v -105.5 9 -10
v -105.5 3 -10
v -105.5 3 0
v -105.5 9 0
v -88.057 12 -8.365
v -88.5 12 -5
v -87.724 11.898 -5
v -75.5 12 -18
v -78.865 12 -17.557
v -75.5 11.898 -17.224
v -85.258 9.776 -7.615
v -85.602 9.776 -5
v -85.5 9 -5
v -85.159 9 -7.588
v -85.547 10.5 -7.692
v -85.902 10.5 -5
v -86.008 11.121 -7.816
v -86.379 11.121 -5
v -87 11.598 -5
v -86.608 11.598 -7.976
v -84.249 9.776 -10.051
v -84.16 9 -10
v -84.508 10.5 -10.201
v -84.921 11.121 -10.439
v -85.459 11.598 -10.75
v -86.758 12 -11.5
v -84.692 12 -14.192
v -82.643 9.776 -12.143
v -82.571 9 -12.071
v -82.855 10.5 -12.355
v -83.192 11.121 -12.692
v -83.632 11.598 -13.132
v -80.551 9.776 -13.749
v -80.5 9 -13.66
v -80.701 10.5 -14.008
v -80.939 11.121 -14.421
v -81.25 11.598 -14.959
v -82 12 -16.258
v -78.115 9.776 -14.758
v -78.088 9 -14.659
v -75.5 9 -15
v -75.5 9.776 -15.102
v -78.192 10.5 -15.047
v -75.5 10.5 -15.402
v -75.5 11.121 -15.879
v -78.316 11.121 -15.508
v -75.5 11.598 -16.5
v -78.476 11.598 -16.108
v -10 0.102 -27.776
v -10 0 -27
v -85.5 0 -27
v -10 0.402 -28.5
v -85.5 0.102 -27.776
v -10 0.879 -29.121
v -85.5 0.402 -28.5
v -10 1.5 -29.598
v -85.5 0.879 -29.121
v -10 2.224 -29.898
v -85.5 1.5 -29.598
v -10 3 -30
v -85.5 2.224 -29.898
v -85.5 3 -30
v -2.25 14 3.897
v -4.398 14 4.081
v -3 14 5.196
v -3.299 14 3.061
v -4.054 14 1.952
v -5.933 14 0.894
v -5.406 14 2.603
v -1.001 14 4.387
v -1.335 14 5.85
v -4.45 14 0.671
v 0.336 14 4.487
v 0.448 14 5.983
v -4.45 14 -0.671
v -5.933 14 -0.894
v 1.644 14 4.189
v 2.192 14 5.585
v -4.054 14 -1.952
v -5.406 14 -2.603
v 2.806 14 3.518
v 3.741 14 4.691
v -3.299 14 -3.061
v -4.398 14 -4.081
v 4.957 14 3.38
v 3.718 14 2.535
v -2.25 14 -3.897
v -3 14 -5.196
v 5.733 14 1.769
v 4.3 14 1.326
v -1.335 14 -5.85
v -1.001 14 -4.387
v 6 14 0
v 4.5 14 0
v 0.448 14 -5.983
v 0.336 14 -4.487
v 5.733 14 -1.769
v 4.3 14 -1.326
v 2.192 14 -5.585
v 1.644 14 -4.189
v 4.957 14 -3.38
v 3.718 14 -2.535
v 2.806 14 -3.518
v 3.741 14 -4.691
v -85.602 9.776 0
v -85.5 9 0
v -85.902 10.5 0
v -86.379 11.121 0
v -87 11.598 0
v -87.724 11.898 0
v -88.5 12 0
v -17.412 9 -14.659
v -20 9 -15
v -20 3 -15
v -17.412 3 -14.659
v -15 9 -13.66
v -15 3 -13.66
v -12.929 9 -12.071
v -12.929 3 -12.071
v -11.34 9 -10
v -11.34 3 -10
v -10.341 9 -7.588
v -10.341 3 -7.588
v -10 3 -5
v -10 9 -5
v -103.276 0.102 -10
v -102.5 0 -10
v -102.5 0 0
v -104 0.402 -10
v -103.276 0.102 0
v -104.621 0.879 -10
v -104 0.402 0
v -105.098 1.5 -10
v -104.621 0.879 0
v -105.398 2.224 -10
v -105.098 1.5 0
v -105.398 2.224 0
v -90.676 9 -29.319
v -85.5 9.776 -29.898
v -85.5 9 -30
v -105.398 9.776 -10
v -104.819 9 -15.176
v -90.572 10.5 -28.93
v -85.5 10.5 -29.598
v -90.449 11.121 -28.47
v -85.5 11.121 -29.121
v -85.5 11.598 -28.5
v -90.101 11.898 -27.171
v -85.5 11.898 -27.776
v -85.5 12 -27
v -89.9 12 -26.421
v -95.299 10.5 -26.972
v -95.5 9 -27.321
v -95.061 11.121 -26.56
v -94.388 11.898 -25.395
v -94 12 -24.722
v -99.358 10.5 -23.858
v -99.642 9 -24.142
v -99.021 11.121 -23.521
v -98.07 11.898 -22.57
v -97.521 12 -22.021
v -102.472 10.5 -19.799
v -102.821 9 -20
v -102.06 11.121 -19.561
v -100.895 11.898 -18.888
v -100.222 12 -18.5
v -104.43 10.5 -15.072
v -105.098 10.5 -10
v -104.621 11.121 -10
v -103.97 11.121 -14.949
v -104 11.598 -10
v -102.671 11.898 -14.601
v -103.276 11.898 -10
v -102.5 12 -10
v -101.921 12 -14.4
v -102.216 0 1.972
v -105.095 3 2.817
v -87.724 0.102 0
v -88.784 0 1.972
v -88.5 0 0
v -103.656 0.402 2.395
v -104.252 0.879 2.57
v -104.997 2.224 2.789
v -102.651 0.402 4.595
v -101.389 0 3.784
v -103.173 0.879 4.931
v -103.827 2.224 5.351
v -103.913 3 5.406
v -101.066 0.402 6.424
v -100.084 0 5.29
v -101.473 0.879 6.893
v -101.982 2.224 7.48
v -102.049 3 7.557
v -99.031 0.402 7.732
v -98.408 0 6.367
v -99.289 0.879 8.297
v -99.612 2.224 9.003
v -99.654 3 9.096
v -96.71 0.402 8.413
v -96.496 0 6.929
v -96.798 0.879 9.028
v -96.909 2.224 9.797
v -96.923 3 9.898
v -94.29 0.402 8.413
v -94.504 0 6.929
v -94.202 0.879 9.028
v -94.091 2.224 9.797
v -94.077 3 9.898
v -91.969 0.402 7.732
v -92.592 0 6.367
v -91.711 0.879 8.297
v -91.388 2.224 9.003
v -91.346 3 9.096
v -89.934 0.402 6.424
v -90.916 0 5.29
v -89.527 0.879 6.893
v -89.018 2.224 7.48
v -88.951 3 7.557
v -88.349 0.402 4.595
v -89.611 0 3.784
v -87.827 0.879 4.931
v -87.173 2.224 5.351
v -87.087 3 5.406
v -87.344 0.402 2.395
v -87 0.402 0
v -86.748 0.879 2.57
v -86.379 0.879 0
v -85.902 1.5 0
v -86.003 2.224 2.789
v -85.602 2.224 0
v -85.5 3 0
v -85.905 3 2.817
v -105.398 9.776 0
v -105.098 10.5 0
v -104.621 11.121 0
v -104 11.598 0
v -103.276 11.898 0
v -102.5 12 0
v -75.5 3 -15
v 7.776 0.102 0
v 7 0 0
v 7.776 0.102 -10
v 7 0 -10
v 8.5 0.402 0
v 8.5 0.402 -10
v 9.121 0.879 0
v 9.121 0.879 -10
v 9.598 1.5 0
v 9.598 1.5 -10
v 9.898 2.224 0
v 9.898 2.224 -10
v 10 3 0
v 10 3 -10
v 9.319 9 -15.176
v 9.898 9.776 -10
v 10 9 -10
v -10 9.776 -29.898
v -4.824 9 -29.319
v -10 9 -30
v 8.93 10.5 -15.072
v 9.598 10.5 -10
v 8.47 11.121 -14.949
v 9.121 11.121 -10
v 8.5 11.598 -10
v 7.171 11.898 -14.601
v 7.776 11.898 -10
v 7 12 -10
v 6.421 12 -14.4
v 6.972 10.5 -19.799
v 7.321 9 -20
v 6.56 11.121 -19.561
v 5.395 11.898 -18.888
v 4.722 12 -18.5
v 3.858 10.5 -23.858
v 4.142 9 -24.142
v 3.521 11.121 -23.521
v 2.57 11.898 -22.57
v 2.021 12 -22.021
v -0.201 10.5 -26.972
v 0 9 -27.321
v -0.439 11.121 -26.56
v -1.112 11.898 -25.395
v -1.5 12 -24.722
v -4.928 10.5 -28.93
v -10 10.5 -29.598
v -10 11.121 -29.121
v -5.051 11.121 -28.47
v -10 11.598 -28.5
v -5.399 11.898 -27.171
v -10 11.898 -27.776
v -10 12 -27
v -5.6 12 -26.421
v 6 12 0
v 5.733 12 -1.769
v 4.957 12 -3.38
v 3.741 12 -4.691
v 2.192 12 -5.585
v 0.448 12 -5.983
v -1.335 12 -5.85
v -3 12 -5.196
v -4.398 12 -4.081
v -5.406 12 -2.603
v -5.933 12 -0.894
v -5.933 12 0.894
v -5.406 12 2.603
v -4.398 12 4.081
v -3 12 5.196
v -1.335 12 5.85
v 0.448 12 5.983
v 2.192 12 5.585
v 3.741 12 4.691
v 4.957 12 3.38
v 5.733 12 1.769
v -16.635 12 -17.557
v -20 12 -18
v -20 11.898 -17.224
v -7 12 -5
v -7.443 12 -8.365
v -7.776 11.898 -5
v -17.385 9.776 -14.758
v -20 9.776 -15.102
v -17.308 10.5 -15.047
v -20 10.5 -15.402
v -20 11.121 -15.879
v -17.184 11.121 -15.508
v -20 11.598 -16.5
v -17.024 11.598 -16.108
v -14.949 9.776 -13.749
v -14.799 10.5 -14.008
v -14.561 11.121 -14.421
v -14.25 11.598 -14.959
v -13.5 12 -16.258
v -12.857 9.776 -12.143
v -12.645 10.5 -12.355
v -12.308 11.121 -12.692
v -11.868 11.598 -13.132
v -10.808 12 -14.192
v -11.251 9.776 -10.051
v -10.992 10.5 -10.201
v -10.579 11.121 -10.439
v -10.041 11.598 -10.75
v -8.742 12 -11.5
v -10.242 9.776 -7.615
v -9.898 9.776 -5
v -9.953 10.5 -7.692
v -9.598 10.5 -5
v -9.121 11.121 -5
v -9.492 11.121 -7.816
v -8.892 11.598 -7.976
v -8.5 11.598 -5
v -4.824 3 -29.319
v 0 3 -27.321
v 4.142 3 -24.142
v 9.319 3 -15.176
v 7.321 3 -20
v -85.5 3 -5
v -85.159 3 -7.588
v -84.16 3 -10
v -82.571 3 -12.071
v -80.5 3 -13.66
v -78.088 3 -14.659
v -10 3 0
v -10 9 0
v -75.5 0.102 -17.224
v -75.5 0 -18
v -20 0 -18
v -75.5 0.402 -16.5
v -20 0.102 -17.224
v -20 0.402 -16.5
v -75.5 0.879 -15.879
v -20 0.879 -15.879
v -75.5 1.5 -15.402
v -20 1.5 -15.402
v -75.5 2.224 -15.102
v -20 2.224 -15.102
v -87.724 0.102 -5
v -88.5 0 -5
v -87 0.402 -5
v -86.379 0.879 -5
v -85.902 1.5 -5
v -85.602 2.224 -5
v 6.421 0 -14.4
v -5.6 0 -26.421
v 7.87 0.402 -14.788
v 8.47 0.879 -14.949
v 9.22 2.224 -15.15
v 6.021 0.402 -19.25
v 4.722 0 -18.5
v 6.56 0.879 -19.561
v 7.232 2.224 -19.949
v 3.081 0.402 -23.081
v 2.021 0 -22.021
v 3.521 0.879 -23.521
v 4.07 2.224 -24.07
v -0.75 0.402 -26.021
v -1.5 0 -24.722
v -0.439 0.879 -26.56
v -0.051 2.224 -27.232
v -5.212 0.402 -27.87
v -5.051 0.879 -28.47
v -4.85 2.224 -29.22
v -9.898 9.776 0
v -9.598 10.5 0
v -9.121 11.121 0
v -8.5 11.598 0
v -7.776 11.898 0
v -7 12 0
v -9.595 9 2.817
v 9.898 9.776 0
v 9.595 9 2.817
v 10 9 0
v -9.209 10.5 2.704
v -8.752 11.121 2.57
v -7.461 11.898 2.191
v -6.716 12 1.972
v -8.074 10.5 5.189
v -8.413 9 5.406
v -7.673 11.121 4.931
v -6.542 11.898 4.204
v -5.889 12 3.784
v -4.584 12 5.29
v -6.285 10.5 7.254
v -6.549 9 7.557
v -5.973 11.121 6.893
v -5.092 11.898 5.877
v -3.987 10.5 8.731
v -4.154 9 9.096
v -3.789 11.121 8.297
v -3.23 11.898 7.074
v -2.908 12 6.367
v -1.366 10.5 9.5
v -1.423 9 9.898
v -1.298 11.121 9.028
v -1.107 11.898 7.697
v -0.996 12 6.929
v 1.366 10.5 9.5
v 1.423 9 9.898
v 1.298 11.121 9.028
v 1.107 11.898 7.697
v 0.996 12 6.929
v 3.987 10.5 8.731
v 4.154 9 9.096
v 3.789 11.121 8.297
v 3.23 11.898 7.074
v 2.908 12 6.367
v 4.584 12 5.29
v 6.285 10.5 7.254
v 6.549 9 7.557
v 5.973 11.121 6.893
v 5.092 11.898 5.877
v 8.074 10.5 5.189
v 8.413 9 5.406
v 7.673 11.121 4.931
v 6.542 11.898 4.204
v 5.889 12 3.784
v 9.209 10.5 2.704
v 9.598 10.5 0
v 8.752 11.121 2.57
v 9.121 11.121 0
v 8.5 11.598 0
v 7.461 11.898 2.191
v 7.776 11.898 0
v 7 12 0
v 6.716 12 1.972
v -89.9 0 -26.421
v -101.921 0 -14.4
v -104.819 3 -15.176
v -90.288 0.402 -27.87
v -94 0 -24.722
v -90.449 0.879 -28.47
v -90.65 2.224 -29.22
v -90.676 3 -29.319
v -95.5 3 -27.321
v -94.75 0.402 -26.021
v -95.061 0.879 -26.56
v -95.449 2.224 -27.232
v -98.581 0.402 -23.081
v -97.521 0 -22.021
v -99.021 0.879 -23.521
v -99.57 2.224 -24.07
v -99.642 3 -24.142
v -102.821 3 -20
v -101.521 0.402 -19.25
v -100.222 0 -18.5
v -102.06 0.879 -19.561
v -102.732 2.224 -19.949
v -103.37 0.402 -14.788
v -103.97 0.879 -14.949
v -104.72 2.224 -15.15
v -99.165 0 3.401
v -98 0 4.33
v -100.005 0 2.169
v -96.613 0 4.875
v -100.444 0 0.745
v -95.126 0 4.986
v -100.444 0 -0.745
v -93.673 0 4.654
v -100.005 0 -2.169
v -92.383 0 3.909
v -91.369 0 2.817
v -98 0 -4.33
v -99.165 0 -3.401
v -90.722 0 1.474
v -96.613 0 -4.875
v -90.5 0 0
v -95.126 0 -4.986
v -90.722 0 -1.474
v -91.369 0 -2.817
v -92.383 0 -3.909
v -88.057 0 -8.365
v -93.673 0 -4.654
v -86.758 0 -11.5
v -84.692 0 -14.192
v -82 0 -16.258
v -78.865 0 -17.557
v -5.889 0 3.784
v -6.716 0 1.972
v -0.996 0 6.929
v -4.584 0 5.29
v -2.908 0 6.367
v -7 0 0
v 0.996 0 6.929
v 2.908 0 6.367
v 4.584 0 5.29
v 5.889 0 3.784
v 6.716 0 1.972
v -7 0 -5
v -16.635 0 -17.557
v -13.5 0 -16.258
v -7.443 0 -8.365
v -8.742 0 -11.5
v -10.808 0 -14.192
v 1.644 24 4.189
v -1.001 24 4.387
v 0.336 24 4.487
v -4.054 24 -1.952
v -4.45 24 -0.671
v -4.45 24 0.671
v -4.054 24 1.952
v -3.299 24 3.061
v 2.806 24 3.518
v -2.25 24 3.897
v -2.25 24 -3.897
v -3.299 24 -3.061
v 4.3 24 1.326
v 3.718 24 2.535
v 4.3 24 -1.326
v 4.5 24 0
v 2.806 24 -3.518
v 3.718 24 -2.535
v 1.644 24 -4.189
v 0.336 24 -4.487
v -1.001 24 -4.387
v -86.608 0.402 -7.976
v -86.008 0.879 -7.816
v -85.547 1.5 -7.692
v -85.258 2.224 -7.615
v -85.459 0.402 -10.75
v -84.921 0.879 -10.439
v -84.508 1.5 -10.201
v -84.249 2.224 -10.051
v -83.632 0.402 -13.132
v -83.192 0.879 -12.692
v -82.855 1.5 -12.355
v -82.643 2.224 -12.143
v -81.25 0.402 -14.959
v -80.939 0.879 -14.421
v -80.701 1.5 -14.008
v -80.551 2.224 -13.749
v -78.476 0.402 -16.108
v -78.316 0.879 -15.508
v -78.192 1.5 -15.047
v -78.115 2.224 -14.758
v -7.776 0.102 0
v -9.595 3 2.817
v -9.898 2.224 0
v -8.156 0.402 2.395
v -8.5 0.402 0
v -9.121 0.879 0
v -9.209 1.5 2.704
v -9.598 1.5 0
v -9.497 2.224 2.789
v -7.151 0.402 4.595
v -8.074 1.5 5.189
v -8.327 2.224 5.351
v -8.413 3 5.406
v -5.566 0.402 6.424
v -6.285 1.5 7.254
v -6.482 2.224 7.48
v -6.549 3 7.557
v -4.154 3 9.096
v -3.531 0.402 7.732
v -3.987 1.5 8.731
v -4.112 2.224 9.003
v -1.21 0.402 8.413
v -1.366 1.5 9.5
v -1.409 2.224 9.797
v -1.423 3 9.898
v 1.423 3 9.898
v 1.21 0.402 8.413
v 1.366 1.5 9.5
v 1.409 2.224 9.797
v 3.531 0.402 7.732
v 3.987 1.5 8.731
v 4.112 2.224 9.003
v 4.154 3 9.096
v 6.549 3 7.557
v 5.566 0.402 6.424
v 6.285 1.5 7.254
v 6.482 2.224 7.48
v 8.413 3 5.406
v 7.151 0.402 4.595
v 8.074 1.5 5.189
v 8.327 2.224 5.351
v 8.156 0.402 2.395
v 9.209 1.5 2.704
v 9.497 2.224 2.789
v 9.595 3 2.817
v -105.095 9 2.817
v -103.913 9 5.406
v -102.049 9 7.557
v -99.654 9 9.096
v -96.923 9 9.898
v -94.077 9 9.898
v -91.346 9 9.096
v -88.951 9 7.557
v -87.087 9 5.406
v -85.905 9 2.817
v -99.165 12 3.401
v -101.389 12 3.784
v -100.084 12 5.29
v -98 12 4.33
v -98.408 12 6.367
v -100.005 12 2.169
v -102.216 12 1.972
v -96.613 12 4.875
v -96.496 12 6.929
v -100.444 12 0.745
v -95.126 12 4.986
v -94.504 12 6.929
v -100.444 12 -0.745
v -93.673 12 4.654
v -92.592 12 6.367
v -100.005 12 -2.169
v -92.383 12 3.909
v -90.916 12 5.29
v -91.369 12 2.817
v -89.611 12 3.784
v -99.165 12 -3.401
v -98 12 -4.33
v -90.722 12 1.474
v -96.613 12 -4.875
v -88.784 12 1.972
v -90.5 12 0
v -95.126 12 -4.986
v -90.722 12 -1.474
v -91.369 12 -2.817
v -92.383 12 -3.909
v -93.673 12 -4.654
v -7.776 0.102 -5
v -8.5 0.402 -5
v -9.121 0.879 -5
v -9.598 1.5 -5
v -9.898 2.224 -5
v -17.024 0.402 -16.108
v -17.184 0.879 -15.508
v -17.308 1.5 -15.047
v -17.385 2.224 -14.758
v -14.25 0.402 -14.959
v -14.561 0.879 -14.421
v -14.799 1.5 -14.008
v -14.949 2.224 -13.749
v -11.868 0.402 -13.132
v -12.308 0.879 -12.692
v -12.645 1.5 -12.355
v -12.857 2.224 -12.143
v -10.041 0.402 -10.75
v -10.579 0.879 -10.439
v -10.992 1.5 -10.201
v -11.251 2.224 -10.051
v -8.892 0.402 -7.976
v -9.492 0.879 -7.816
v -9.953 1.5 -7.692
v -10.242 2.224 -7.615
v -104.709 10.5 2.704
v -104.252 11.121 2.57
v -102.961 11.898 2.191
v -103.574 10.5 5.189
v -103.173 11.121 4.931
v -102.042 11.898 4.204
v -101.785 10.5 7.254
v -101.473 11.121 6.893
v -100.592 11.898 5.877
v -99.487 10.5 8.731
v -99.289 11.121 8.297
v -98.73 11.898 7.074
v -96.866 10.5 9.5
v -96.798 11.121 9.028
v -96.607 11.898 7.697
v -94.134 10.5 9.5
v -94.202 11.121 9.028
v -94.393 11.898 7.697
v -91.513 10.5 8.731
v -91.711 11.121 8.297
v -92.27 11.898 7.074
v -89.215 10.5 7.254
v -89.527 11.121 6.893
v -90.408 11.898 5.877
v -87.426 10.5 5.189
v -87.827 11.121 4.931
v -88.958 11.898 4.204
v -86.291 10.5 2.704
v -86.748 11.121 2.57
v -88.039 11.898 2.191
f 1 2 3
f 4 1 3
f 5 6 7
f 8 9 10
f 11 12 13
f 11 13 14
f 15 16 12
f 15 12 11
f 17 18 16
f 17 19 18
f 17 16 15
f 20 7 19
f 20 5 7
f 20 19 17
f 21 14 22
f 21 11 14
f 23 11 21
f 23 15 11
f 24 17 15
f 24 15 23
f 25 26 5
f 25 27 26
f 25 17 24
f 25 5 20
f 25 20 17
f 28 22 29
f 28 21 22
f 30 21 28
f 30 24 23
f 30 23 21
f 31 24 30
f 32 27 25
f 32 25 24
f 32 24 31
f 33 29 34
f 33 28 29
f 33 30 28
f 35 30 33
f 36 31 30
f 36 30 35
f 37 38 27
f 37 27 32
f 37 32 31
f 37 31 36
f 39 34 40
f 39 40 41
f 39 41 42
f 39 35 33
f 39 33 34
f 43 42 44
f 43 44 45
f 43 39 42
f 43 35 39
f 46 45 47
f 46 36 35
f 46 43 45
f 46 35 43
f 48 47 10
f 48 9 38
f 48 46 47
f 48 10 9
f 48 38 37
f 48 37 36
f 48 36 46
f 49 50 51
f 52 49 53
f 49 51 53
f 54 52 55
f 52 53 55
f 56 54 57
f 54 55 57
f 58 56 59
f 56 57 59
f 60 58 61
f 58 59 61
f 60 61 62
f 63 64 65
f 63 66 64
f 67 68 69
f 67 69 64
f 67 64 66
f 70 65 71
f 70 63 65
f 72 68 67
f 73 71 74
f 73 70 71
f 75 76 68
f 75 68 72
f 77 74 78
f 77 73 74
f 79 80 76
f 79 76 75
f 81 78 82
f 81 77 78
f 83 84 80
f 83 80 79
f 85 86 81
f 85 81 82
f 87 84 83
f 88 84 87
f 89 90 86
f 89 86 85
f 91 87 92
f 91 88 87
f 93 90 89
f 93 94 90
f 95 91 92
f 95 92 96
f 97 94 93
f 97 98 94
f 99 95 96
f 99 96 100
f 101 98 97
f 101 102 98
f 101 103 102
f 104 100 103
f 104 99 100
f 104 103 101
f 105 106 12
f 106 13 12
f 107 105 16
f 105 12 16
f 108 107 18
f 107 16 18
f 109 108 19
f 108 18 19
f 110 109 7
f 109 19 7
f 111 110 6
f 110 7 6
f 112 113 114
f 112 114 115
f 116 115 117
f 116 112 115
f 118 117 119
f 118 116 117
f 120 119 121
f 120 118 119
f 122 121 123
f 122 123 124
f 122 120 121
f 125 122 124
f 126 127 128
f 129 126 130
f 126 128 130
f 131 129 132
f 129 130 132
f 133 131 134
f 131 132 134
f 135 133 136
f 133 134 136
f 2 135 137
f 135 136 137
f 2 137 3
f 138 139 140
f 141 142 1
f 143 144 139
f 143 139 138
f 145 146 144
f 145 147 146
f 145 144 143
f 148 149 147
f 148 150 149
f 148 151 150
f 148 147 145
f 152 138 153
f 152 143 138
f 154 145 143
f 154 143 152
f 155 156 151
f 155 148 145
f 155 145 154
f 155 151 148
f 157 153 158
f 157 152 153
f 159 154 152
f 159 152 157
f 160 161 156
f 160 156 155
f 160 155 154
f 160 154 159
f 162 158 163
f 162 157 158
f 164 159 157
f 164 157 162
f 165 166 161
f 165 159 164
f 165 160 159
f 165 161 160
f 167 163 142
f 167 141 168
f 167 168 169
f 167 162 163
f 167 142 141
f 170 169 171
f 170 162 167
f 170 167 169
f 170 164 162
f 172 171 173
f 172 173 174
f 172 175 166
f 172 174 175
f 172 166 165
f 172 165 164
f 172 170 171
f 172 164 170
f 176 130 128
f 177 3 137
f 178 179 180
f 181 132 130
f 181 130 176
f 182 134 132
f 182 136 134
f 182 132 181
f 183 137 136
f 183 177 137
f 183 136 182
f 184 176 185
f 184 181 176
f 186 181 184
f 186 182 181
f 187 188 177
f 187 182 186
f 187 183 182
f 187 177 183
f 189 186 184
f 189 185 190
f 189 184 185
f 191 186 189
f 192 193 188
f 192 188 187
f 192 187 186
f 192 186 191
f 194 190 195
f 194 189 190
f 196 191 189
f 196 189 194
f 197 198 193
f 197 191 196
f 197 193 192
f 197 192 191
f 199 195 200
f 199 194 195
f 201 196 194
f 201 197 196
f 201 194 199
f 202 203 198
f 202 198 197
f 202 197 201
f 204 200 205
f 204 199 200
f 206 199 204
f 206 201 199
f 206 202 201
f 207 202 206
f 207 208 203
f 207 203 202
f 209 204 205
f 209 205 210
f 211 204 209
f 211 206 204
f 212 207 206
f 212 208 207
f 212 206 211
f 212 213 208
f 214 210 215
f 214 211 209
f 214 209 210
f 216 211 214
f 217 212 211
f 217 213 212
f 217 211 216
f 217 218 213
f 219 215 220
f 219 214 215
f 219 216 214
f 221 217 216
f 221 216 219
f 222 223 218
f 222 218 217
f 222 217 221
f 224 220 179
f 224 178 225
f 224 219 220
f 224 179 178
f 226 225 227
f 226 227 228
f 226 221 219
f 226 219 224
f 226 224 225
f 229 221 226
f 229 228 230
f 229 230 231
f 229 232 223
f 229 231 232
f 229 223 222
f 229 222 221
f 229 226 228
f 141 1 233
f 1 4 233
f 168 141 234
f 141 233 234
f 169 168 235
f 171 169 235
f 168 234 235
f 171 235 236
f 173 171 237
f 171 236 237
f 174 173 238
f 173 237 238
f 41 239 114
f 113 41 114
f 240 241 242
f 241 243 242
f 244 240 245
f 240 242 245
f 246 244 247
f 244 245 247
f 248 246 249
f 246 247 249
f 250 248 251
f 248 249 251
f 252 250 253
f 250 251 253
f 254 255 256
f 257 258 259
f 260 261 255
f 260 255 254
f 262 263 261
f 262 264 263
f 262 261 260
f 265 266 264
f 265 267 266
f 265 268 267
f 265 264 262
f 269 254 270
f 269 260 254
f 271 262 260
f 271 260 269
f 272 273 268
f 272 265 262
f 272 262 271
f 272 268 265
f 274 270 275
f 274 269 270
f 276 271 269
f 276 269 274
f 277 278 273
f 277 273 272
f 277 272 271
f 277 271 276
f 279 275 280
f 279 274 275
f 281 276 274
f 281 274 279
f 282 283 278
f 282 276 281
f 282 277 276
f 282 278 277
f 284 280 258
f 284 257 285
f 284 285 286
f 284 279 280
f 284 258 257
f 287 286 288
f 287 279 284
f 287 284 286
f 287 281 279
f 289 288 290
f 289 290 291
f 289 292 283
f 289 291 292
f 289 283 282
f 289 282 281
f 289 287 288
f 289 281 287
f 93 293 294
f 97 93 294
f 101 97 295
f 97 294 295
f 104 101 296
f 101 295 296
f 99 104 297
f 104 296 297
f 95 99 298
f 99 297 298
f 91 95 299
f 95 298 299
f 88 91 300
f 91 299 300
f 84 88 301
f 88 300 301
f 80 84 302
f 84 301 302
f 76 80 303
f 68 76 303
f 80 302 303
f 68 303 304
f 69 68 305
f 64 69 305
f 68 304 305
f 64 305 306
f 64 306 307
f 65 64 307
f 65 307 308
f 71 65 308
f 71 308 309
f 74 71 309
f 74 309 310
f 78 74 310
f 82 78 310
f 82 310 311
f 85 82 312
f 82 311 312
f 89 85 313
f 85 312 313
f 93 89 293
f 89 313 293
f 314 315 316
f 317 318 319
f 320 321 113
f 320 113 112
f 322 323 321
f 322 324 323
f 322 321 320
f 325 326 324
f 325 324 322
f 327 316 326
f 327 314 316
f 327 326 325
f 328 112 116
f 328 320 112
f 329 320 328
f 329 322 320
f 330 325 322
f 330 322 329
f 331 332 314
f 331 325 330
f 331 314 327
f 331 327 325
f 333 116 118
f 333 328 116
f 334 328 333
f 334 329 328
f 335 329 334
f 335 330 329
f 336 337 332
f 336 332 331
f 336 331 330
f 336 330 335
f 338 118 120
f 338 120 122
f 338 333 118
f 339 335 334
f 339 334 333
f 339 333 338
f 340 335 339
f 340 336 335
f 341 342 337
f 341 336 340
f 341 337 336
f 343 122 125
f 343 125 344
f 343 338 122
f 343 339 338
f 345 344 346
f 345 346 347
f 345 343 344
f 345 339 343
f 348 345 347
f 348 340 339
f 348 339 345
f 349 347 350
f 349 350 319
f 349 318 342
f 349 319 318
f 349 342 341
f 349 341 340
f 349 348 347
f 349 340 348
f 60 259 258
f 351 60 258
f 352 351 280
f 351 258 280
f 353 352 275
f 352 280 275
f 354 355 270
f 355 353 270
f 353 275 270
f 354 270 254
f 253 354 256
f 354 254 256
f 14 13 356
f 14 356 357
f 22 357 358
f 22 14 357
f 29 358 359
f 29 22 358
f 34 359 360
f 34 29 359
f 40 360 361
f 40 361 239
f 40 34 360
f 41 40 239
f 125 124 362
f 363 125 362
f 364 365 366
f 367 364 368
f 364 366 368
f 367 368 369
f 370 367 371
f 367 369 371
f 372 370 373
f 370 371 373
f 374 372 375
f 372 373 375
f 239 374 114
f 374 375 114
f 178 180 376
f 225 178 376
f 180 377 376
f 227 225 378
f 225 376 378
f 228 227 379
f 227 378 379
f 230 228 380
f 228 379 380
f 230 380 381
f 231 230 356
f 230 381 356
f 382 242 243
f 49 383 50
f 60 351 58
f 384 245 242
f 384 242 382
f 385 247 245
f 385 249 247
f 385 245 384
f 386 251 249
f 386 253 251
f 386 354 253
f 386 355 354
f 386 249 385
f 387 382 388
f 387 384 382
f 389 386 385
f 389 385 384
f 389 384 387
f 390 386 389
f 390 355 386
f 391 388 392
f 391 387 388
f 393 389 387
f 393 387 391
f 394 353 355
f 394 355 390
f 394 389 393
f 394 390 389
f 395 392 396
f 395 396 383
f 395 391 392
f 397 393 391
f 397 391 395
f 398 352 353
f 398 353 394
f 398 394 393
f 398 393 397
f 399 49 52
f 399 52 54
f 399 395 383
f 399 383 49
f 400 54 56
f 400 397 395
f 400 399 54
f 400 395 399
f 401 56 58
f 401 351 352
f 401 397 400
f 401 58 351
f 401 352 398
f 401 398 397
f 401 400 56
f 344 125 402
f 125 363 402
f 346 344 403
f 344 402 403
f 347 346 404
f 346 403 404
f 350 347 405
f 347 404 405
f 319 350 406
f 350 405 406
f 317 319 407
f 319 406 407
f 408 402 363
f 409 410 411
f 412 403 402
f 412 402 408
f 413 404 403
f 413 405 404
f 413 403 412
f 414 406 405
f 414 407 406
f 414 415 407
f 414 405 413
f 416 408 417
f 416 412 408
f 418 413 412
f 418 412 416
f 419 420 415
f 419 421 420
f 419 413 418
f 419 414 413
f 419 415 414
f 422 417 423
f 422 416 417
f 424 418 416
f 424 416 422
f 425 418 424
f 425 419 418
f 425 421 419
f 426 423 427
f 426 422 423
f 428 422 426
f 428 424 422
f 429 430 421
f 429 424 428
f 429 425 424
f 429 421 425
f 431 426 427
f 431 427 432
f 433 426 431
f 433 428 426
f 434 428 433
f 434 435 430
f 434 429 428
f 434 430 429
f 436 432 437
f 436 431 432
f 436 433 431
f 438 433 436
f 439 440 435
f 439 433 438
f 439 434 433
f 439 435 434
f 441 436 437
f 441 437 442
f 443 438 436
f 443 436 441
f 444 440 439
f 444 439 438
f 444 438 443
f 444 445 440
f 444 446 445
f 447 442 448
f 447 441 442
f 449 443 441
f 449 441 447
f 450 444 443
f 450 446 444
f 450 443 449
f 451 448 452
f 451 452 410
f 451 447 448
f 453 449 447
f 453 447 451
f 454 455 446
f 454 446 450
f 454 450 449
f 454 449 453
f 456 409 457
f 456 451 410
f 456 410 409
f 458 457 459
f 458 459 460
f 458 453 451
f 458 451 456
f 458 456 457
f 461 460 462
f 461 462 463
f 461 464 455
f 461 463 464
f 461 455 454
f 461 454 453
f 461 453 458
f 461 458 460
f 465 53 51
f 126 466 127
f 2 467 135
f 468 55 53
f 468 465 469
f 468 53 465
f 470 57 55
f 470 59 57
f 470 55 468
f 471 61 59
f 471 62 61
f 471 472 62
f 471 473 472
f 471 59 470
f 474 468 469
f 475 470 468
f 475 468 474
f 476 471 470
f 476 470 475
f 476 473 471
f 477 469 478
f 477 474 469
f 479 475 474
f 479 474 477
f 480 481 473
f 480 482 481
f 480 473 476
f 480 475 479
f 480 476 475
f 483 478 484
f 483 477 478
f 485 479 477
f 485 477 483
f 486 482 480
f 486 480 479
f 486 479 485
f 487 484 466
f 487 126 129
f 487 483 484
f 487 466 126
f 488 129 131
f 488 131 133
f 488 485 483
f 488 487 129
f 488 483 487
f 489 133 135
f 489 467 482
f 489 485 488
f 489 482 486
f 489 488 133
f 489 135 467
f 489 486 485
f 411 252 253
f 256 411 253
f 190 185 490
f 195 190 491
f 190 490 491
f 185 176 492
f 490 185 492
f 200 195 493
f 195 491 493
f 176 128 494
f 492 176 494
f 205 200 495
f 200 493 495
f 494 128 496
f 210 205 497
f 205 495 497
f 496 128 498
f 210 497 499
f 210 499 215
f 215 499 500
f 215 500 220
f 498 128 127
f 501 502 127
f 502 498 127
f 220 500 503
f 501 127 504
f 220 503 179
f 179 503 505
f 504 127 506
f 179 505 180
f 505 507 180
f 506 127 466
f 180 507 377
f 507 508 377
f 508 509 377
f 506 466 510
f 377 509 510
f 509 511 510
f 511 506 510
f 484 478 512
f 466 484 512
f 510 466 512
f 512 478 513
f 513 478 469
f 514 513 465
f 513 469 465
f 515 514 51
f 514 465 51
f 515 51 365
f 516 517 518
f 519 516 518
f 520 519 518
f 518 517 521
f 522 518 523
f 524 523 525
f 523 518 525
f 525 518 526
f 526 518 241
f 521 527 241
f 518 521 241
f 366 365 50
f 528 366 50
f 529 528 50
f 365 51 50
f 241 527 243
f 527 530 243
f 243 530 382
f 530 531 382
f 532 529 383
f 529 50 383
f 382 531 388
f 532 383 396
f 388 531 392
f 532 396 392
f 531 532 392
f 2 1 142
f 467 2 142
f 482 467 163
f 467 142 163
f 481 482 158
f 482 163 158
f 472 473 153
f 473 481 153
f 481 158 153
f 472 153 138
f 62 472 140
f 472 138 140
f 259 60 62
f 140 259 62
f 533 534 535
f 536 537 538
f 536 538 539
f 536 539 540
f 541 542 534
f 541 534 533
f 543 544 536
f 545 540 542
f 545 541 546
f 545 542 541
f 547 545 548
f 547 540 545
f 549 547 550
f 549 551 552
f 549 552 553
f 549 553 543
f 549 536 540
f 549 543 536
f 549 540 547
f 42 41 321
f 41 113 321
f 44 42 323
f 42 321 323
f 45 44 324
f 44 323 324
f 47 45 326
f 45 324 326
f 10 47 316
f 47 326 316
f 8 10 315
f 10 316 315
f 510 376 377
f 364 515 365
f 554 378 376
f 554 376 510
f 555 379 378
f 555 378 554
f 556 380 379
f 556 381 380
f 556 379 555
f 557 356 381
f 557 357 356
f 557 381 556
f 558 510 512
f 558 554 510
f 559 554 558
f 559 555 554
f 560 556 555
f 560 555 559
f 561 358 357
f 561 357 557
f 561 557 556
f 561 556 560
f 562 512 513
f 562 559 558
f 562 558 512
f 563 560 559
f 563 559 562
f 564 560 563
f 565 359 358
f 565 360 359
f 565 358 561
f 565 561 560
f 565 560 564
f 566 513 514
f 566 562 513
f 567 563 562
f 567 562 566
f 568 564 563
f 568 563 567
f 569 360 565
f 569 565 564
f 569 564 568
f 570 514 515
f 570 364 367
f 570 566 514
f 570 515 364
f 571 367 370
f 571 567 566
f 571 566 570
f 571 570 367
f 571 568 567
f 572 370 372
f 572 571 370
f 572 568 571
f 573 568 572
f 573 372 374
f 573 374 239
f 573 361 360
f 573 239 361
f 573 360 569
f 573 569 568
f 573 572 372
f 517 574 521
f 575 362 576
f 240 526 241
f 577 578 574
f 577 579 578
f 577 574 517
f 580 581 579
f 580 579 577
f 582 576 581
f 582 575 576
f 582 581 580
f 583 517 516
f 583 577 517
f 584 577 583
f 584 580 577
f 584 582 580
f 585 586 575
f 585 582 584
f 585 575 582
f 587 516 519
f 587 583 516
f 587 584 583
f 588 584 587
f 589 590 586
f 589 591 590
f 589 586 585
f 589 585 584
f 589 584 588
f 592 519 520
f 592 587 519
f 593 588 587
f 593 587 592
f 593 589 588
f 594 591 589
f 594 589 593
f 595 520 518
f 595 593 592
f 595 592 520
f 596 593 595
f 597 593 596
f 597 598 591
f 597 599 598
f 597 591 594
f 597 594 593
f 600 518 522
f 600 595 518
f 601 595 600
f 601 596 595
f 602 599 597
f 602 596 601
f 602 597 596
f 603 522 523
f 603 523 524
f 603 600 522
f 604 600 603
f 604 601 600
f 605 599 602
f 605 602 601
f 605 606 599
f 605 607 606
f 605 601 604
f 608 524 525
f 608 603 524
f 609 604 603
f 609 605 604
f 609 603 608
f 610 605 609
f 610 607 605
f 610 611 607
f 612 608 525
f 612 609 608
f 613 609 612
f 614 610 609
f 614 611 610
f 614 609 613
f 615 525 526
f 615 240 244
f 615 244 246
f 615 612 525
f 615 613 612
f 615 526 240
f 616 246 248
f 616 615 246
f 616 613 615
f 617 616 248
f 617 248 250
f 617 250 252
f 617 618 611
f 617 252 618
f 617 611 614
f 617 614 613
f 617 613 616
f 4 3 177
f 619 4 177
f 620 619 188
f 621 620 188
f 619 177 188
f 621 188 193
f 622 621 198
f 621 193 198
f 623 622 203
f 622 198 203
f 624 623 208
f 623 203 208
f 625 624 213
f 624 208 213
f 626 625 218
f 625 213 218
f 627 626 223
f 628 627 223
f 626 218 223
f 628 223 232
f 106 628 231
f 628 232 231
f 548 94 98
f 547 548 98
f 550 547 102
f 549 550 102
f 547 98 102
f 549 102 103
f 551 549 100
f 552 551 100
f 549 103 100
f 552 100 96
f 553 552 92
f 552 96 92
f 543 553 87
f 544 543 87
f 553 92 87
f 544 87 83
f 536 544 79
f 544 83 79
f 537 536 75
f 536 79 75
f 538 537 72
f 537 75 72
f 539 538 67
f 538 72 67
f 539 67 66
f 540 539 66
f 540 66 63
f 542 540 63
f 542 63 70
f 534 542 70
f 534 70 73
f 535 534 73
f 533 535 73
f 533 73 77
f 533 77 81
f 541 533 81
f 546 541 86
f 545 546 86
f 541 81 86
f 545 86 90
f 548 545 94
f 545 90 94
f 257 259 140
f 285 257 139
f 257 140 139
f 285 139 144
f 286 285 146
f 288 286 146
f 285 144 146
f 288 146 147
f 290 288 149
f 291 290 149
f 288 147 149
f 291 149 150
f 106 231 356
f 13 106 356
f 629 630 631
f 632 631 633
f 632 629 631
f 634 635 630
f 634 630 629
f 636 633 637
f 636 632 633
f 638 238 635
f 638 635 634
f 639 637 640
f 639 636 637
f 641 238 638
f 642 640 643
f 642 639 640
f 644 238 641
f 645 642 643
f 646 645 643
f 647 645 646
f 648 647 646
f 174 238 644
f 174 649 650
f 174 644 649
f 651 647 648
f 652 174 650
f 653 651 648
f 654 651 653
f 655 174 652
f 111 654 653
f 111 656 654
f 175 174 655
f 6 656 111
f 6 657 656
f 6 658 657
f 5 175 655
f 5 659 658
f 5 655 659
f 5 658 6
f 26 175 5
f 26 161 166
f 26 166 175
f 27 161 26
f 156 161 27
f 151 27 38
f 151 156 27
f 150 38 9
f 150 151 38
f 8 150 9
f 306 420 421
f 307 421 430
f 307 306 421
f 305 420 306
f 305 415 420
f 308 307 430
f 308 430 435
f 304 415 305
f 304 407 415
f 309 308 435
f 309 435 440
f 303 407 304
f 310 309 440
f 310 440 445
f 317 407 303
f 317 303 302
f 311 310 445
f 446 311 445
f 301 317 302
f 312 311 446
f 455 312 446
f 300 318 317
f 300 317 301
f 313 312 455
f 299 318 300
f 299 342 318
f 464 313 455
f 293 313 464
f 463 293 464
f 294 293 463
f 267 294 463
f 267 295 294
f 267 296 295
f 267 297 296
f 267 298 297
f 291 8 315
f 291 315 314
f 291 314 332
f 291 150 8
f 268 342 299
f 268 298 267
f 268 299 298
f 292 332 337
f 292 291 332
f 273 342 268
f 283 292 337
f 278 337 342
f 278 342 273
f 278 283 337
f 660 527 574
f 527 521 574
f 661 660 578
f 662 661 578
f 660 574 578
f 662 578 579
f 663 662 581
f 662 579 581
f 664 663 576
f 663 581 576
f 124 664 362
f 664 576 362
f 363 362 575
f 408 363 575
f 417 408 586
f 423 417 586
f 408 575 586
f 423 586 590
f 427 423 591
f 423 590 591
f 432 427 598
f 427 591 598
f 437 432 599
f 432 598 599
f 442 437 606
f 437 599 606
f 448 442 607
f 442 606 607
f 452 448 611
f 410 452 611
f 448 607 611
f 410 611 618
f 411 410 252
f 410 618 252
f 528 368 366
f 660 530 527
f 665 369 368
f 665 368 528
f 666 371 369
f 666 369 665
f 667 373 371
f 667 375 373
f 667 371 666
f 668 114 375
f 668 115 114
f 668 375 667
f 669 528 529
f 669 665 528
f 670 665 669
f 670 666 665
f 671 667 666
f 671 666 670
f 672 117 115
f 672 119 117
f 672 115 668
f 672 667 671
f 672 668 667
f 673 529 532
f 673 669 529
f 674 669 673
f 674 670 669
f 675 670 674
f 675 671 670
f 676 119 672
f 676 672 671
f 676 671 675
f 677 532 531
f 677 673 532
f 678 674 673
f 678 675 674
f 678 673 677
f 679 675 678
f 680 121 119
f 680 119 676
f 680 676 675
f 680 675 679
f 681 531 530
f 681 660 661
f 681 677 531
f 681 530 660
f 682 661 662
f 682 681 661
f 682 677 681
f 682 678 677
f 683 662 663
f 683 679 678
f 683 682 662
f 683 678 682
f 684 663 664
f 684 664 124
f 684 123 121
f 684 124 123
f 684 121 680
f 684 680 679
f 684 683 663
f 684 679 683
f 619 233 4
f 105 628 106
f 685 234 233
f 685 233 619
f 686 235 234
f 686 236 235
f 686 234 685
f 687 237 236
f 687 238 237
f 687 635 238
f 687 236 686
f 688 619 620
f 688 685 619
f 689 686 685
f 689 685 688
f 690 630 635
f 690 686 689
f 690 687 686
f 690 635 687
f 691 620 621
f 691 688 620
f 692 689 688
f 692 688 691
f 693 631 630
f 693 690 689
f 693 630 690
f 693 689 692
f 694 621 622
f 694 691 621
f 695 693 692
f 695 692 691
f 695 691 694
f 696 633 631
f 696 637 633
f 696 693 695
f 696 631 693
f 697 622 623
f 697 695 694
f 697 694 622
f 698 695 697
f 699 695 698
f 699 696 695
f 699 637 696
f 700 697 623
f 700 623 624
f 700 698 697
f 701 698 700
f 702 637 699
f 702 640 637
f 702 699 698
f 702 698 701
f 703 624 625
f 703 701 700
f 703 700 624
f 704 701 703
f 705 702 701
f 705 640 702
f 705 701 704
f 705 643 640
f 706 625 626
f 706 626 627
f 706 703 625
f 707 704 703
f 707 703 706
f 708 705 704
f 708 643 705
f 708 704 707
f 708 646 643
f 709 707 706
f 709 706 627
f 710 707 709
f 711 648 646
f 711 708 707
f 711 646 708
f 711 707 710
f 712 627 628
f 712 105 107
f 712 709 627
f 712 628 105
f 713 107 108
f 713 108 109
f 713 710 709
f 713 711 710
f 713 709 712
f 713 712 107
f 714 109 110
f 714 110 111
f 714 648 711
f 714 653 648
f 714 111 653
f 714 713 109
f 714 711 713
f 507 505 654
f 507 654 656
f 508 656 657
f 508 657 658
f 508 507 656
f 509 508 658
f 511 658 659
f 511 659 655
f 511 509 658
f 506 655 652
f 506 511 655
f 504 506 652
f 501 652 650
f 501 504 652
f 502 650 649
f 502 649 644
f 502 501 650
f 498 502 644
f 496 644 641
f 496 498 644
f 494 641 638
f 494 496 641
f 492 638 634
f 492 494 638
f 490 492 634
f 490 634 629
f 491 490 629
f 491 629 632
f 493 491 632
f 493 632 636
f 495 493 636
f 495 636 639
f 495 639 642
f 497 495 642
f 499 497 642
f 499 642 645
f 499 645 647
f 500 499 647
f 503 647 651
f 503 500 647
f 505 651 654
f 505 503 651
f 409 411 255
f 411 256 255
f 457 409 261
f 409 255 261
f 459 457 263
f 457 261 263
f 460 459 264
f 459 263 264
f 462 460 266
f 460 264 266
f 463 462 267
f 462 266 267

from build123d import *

# Parameters (mm, degrees)
SKETCH7_R           = 5
BOSS_EXTRUDE5_DEPTH = 12
SKETCH8_R           = 6
BOSS_EXTRUDE6_DEPTH = 2
SKETCH9_R           = 4.5
BOSS_EXTRUDE7_DEPTH = 10
FILLET2_R           = 20
FILLET3_R           = 10
FILLET5_R           = 3


with BuildPart() as part:
    # Sketch7 → Boss-Extrude5 (new body)
    with BuildSketch(Plane(origin=(0, 0, 0), x_dir=(1, 0, 0), z_dir=(0, 1, 0))):
        with BuildLine():
            Line((-105.5, 30), (-105.5, 0))
            ThreePointArc((-105.5, 0), (-95.5, -10), (-85.5, 0))
            Line((-85.5, 0), (-85.5, 15))
            Line((-85.5, 15), (-10, 15))
            Line((-10, 15), (-10, 0))
            ThreePointArc((-10, 0), (0, -10), (10, 0))
            Line((10, 0), (10, 30))
            Line((10, 30), (-10, 30))
            Line((-10, 30), (-85.5, 30))
            Line((-85.5, 30), (-105.5, 30))
        make_face()
        with Locations((-95.5, 0)):
            Circle(SKETCH7_R, mode=Mode.SUBTRACT)
    extrude(amount=BOSS_EXTRUDE5_DEPTH)

    # Sketch8 → Boss-Extrude6 (add)
    with BuildSketch(Plane(origin=(0, 12, 0), x_dir=(1, 0, 0), z_dir=(0, 1, 0))):
        Circle(SKETCH8_R)
    extrude(amount=BOSS_EXTRUDE6_DEPTH)

    # Sketch9 → Boss-Extrude7 (add)
    with BuildSketch(Plane(origin=(0, 14, 0), x_dir=(1, 0, 0), z_dir=(0, 1, 0))):
        Circle(SKETCH9_R)
    extrude(amount=BOSS_EXTRUDE7_DEPTH)

    # Fillet2
    fillet2_edges = [part.edges().sort_by_distance(p)[0] for p in [
        (-105.5, 6, -30),
        (10, 6, -30),
    ]]
    fillet(fillet2_edges, radius=FILLET2_R)

    # Fillet3
    fillet3_edges = [part.edges().sort_by_distance(p)[0] for p in [
        (-10, 6, -15),
        (-85.5, 6, -15),
    ]]
    fillet(fillet3_edges, radius=FILLET3_R)

    # Fillet5
    fillet5_edges = [part.edges().sort_by_distance(p)[0] for p in [
        (10, 0, -5),
        (-105.5, 12, -5),
        (0, 0, 10),
        (-10, 0, -2.5),
        (-85.5, 0, -2.5),
        (-95.5, 0, 10),
        (-105.5, 0, -5),
        (-95.5, 12, 10),
        (-85.5, 12, -2.5),
        (-10, 12, -2.5),
        (0, 12, 10),
        (-47.75, 0, -30),
        (-47.75, 12, -30),
        (-99.642135624, 0, -24.142135624),
        (10, 12, -5),
        (4.142135624, 0, -24.142135624),
        (-99.642135624, 12, -24.142135624),
        (4.142135624, 12, -24.142135624),
        (-47.75, 0, -15),
        (-47.75, 12, -15),
        (-12.928932188, 0, -12.071067812),
        (-12.928932188, 12, -12.071067812),
        (-82.571067812, 0, -12.071067812),
        (-82.571067812, 12, -12.071067812),
    ]]
    fillet(fillet5_edges, radius=FILLET5_R)


solid = part.part
